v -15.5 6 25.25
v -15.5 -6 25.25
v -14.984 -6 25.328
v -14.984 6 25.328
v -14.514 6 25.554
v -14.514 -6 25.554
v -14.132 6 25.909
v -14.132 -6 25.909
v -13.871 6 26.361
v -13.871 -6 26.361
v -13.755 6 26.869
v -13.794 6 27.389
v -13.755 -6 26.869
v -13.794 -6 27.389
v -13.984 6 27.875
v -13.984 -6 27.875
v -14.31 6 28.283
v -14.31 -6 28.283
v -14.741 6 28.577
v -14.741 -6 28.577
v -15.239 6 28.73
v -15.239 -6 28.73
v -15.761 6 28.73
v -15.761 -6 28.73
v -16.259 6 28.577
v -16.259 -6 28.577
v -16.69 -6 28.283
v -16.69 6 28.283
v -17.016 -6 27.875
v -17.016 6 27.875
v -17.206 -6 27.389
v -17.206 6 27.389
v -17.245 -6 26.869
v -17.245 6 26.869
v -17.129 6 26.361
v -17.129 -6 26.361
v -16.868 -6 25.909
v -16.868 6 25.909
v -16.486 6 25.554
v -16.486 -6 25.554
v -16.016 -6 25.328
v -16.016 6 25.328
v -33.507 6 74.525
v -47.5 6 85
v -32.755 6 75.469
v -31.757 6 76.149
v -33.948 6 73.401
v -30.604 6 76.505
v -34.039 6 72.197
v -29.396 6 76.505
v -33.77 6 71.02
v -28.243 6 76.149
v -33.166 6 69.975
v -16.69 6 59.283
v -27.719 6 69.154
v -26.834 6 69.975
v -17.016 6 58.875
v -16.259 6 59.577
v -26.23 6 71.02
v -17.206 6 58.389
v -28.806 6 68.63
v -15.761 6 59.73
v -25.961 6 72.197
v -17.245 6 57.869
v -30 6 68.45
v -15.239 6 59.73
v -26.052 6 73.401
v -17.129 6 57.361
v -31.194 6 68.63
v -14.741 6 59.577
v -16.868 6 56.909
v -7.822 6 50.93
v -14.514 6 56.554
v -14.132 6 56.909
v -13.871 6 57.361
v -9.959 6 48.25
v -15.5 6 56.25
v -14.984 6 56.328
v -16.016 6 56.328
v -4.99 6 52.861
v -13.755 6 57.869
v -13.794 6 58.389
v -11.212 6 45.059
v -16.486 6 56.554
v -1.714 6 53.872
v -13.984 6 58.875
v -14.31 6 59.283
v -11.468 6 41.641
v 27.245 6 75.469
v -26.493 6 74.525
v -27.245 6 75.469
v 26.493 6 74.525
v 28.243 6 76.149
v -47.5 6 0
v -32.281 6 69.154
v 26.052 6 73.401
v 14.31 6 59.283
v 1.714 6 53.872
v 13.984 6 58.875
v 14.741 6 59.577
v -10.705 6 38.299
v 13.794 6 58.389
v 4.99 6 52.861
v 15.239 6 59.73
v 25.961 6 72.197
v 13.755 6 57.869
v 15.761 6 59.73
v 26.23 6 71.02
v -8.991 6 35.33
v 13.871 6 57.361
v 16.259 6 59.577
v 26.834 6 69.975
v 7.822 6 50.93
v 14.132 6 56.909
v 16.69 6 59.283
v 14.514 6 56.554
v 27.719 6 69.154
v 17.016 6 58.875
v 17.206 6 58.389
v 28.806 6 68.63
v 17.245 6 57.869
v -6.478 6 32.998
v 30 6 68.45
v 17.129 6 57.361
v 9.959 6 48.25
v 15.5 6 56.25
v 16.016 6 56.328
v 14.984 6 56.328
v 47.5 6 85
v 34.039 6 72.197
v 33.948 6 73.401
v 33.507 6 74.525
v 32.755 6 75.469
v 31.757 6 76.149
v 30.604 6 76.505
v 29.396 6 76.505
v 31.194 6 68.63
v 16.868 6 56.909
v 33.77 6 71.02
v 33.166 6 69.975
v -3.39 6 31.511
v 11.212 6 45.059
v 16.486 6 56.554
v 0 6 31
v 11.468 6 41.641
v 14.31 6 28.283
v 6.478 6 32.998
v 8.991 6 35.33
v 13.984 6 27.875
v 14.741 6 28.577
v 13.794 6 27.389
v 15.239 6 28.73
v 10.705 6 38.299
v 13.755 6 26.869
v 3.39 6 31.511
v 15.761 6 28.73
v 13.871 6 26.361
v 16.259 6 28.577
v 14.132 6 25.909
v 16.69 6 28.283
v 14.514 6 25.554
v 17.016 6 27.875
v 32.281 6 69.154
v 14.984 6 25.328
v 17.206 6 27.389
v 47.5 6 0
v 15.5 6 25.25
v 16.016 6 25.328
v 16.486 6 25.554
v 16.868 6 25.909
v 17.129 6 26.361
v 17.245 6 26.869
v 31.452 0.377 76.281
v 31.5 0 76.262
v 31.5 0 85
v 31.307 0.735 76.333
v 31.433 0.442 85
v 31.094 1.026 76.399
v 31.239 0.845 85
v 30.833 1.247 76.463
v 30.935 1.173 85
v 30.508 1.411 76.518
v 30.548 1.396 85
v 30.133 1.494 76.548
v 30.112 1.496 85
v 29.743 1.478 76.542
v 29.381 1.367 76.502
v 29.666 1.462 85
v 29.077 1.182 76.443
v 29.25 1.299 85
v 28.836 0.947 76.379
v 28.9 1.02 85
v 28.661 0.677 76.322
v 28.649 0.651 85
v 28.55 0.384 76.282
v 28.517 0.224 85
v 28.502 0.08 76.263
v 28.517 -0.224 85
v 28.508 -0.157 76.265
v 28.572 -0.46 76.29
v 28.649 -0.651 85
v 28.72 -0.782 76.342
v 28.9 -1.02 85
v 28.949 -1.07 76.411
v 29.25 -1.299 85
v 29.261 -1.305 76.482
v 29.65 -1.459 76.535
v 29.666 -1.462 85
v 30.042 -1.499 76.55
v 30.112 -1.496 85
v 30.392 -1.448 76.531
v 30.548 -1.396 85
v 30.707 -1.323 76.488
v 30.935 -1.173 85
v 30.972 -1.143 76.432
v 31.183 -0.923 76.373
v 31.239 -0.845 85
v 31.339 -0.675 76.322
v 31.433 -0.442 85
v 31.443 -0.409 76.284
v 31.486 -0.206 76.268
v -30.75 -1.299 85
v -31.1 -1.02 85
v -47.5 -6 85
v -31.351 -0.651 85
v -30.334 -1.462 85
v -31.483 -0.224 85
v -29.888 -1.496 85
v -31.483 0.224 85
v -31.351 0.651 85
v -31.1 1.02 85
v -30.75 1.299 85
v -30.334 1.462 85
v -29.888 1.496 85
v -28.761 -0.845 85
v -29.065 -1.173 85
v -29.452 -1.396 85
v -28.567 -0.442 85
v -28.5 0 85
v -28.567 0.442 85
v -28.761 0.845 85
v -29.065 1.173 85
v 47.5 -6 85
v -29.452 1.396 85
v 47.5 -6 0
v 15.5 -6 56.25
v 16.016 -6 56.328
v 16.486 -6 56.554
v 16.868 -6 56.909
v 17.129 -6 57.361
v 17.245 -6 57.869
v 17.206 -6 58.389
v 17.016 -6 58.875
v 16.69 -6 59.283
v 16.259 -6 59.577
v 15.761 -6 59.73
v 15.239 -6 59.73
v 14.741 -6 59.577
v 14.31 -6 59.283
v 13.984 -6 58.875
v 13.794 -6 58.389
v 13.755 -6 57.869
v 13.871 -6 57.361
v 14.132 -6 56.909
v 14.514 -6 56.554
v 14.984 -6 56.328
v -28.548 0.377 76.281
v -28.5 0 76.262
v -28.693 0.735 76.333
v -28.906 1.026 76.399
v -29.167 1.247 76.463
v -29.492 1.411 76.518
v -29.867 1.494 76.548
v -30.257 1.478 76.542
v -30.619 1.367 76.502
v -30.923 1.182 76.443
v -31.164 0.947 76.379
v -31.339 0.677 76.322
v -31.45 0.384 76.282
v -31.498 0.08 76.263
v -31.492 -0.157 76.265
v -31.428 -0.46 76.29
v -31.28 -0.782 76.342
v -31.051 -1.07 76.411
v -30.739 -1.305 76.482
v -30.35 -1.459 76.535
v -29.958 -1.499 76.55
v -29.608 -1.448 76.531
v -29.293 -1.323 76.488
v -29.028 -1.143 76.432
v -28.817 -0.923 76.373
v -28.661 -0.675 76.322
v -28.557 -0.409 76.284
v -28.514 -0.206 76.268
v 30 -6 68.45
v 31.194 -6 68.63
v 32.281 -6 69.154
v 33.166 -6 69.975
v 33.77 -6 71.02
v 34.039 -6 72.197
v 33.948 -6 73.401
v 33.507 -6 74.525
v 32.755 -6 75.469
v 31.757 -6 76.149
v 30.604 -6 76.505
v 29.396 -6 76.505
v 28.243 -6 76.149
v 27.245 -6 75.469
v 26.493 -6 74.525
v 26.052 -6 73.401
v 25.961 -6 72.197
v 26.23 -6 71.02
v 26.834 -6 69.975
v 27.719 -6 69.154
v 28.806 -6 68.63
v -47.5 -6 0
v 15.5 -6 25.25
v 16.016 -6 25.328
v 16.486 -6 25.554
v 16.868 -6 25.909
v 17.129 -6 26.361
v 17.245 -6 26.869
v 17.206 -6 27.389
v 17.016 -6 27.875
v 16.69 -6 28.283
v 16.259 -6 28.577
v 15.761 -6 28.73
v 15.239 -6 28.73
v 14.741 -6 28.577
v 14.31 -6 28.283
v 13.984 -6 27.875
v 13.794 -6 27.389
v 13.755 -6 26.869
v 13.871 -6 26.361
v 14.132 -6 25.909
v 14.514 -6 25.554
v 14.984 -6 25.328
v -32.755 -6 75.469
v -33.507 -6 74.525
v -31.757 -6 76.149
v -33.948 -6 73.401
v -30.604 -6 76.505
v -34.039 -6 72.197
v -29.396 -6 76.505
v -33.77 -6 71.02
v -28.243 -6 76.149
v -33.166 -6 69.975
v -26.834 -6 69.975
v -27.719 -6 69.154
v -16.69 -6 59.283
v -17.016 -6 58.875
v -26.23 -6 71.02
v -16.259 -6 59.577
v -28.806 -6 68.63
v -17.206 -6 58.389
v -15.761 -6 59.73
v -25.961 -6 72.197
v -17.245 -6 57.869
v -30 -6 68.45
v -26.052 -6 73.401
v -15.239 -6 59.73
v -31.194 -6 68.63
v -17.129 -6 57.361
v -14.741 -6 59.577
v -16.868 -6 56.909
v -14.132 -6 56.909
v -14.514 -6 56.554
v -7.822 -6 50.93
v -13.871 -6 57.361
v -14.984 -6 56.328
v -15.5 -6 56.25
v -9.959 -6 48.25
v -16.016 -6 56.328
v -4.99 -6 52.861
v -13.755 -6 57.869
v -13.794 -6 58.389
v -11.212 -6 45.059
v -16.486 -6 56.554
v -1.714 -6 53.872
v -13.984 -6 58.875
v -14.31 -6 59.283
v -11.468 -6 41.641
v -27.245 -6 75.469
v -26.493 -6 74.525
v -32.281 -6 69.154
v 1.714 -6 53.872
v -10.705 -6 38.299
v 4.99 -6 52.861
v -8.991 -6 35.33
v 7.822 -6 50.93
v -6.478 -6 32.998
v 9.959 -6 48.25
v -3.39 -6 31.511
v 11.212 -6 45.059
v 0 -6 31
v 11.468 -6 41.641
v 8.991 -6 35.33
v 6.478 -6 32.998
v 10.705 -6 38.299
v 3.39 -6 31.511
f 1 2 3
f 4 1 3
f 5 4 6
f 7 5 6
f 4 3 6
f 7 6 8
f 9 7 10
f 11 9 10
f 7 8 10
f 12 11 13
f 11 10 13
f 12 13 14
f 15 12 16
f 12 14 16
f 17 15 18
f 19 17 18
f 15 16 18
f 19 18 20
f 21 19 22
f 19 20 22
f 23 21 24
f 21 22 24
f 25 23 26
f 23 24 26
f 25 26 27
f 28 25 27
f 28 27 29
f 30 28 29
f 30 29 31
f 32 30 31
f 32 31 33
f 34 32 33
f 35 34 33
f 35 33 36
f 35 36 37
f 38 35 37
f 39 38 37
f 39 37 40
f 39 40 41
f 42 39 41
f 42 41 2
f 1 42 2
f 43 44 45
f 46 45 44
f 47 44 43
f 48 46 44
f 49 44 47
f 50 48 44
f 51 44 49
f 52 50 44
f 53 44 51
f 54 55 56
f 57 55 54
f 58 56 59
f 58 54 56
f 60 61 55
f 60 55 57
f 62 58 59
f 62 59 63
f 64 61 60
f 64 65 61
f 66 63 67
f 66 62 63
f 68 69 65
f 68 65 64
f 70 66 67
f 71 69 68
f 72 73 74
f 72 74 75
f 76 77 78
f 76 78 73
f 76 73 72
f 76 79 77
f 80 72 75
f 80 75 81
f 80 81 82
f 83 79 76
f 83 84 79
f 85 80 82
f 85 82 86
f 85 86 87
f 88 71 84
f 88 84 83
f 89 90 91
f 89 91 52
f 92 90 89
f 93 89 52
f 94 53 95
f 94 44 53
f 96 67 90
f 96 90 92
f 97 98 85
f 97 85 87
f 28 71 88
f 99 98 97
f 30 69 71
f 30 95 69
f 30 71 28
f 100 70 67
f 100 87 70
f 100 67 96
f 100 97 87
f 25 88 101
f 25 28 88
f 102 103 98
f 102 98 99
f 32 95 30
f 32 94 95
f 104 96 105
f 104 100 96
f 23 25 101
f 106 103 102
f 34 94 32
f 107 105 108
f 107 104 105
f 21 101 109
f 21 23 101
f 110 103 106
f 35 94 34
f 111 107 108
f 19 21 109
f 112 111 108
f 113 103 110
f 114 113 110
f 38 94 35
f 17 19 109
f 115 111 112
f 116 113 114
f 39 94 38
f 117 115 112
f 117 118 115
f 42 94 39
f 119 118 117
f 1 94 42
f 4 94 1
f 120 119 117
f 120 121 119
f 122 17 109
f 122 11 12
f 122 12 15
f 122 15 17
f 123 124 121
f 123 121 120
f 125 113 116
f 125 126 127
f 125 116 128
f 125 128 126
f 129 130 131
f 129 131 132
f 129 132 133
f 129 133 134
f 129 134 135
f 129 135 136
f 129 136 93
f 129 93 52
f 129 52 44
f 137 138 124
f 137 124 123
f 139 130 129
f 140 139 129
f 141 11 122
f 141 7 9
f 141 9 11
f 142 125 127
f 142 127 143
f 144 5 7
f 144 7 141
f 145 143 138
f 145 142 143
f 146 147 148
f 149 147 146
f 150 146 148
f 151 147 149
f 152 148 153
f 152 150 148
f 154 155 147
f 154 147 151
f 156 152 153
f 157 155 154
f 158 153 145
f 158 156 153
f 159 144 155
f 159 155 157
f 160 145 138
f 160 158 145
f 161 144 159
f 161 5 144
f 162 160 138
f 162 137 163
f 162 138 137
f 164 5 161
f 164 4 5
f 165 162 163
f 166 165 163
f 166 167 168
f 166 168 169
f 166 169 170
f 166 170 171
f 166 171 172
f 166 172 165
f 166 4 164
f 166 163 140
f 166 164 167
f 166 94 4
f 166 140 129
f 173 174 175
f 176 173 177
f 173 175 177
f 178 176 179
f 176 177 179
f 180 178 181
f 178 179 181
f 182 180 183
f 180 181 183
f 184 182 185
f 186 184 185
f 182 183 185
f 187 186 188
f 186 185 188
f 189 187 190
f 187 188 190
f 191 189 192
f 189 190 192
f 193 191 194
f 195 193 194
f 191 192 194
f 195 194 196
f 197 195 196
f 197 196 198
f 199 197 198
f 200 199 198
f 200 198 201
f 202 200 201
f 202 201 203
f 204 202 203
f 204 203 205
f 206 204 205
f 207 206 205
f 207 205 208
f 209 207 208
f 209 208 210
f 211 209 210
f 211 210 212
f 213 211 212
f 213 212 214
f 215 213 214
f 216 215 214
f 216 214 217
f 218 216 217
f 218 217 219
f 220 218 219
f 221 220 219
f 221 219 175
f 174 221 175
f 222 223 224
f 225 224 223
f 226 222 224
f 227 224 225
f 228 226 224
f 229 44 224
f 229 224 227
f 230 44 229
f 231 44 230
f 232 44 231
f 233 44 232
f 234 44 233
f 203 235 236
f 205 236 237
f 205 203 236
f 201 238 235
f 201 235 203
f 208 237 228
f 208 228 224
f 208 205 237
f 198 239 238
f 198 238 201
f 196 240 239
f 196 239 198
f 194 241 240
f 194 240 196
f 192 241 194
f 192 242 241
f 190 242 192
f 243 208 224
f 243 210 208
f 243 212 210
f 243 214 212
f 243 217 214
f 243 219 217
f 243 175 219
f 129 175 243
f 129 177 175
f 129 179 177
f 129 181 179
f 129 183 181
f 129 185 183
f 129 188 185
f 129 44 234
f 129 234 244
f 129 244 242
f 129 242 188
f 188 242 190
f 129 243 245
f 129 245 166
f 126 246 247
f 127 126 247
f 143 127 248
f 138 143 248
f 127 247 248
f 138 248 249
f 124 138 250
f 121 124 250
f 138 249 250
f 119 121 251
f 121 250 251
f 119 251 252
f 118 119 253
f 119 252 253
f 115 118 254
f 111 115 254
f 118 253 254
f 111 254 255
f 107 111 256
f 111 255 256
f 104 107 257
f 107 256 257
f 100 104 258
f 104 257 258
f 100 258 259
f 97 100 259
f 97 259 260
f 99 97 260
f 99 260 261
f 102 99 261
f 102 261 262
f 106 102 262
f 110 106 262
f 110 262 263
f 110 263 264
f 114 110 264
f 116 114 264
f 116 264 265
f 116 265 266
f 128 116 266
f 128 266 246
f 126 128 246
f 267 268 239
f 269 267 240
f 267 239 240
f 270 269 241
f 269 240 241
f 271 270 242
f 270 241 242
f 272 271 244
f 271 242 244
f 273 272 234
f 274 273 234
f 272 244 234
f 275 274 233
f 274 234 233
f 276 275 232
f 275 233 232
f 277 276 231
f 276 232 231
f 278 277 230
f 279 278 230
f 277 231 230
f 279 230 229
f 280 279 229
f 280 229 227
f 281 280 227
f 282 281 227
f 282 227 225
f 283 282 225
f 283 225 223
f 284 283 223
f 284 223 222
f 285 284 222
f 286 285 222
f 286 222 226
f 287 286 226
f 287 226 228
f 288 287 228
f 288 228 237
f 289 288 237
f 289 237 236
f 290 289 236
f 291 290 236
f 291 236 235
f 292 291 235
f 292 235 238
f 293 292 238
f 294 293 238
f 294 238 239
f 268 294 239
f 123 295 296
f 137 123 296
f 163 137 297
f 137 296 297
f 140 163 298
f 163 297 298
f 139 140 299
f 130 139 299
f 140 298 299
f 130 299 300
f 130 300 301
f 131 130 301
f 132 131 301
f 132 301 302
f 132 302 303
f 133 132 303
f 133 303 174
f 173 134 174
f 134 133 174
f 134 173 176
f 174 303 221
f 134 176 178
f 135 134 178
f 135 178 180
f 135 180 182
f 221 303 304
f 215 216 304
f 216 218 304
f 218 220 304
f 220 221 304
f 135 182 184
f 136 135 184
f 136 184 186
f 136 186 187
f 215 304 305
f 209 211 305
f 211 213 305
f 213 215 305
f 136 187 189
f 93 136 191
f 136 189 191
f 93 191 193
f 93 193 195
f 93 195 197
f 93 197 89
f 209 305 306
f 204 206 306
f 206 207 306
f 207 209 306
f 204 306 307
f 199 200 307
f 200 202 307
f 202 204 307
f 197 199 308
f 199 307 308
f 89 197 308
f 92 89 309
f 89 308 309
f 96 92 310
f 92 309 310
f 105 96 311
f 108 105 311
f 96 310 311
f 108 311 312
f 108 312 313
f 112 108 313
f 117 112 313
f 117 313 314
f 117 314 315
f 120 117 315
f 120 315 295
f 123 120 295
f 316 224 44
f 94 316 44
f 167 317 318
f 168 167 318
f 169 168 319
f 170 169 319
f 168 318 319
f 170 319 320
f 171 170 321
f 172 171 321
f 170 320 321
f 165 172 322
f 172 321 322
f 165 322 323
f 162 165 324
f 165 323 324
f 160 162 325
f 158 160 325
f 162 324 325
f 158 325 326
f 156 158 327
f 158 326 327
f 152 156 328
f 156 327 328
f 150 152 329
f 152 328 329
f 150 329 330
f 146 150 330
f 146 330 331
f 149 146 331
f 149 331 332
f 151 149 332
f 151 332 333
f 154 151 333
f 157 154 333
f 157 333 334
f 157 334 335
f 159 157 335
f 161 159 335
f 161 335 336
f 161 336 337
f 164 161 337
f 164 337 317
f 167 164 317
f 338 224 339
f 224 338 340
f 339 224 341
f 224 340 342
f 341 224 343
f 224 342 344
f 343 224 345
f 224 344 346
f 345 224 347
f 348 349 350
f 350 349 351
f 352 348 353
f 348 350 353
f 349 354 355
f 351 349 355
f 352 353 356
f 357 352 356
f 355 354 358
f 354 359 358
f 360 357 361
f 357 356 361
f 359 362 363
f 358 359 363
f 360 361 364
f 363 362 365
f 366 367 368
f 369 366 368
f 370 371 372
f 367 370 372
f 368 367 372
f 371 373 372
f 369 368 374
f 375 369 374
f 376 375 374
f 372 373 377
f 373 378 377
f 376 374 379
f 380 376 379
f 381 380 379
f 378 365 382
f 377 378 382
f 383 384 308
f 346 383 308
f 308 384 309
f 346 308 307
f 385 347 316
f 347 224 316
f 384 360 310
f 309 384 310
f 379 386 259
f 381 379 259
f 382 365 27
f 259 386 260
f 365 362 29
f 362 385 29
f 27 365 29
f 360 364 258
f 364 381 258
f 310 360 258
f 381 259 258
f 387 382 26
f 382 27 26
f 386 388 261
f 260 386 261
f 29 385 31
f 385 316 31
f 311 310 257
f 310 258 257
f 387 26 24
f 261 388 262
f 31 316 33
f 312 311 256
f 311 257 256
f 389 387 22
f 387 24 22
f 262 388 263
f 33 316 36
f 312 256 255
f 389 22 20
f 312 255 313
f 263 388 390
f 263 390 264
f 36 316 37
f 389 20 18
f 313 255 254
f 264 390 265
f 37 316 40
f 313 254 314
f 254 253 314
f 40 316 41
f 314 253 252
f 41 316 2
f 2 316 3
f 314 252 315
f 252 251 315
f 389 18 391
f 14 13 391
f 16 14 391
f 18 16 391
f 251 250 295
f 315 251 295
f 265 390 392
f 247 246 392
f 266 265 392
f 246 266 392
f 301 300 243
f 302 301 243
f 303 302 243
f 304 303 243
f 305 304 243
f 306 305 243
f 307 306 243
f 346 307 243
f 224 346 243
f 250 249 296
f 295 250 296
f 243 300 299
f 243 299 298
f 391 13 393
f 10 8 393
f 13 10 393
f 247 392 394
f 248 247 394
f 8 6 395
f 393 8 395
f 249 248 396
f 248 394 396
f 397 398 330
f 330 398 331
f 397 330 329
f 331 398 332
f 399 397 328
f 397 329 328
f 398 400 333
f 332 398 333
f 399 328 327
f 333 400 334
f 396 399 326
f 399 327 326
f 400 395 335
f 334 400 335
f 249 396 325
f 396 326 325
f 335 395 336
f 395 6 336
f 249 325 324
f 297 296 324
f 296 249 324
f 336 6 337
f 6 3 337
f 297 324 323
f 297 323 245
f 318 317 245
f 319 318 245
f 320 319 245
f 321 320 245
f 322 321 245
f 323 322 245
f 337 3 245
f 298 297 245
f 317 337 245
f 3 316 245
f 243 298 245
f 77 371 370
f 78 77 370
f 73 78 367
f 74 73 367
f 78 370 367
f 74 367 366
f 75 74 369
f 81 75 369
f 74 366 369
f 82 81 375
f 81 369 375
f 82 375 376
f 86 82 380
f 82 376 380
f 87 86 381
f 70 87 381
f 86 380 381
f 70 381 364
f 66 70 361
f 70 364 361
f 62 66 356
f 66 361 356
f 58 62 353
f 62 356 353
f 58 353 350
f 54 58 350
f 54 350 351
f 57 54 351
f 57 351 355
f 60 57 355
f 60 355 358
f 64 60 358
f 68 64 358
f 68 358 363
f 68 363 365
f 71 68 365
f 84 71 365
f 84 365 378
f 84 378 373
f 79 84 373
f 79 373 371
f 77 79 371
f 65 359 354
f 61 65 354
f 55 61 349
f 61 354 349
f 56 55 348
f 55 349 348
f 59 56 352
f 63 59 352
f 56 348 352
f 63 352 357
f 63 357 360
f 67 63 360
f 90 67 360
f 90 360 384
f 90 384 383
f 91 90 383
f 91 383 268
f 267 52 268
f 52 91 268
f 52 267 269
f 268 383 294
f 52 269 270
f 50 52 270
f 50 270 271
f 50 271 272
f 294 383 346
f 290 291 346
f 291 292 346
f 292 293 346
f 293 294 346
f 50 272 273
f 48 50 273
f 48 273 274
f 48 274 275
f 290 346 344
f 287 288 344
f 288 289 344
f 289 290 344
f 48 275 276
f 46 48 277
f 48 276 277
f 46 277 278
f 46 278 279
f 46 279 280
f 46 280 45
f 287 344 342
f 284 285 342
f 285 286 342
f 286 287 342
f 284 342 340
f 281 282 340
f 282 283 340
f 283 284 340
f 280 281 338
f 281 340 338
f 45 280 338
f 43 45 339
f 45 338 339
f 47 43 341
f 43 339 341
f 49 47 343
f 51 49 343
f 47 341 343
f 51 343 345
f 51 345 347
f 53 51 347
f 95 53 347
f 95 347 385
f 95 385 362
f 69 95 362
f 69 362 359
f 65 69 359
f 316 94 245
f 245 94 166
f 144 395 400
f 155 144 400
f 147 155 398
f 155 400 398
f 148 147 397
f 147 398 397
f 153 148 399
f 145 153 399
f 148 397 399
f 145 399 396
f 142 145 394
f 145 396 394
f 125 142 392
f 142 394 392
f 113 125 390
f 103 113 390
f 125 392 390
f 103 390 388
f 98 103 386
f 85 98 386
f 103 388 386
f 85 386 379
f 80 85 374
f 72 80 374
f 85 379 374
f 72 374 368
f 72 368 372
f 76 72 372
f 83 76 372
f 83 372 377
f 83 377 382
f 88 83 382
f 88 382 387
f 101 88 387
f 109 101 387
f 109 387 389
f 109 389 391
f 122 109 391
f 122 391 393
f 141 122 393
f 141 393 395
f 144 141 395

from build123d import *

# Parameters (mm, degrees)
SKETCH1_W           = 95
SKETCH1_H           = 12
BOSS_EXTRUDE1_DEPTH = 85
SKETCH2_R           = 4.05
SKETCH2_R_2         = 11.5
CUT_EXTRUDE1_DEPTH  = 13
CUT_EXTRUDE3_REACH  = 87
SKETCH4_R           = 1.5
SKETCH6_R           = 1.75
CUT_EXTRUDE4_DEPTH  = 13.0000001


with BuildPart() as part:
    # Sketch1 → Boss-Extrude1 (new body)
    with BuildSketch(Plane.XY):
        Rectangle(SKETCH1_W, SKETCH1_H)
    extrude(amount=BOSS_EXTRUDE1_DEPTH)

    # Sketch2 → Cut-Extrude1 (cut, through all)
    with BuildSketch(Plane.XZ.offset(6)):
        with Locations(Location((-30, 72.5, 0), (0, 0, 270))):  # turned: the seam where the file's is
            Circle(SKETCH2_R)
        with Locations(Location((30, 72.5, 0), (0, 0, 270))):  # turned: the seam where the file's is
            Circle(SKETCH2_R)
        with Locations(Location((0, 42.5, 0), (0, 0, 270))):  # turned: the seam where the file's is
            Circle(SKETCH2_R_2)
    extrude(amount=-CUT_EXTRUDE1_DEPTH, mode=Mode.SUBTRACT)

    # Sketch4 → Cut-Extrude3 (cut, up to next)
    with BuildSketch(Plane.XY.offset(85), mode=Mode.PRIVATE) as cut_extrude3_sk1:
        with Locations((30, 0)):
            Circle(SKETCH4_R)
    cut_extrude3_tool1 = extrude(cut_extrude3_sk1.sketch, amount=-CUT_EXTRUDE3_REACH, mode=Mode.PRIVATE) & part.part
    add(cut_extrude3_tool1.solids().sort_by_distance((30, 0, 85))[0], mode=Mode.SUBTRACT)
    # Sketch4 → Cut-Extrude3 (cut, up to next)
    with BuildSketch(Plane.XY.offset(85), mode=Mode.PRIVATE) as cut_extrude3_sk2:
        with Locations((-30, 0)):
            Circle(SKETCH4_R)
    cut_extrude3_tool2 = extrude(cut_extrude3_sk2.sketch, amount=-CUT_EXTRUDE3_REACH, mode=Mode.PRIVATE) & part.part
    add(cut_extrude3_tool2.solids().sort_by_distance((-30, 0, 85))[0], mode=Mode.SUBTRACT)

    # Sketch6 → Cut-Extrude4 (cut, through all)
    with BuildSketch(Plane.XZ.offset(6)):
        with Locations(Location((-15.5, 58, 0), (0, 0, 270))):  # turned: the seam where the file's is
            Circle(SKETCH6_R)
        with Locations(Location((-15.5, 27, 0), (0, 0, 270))):  # turned: the seam where the file's is
            Circle(SKETCH6_R)
        with Locations(Location((15.5, 58, 0), (0, 0, 270))):  # turned: the seam where the file's is
            Circle(SKETCH6_R)
        with Locations(Location((15.5, 27, 0), (0, 0, 270))):  # turned: the seam where the file's is
            Circle(SKETCH6_R)
    extrude(amount=-CUT_EXTRUDE4_DEPTH, mode=Mode.SUBTRACT)


solid = part.part
